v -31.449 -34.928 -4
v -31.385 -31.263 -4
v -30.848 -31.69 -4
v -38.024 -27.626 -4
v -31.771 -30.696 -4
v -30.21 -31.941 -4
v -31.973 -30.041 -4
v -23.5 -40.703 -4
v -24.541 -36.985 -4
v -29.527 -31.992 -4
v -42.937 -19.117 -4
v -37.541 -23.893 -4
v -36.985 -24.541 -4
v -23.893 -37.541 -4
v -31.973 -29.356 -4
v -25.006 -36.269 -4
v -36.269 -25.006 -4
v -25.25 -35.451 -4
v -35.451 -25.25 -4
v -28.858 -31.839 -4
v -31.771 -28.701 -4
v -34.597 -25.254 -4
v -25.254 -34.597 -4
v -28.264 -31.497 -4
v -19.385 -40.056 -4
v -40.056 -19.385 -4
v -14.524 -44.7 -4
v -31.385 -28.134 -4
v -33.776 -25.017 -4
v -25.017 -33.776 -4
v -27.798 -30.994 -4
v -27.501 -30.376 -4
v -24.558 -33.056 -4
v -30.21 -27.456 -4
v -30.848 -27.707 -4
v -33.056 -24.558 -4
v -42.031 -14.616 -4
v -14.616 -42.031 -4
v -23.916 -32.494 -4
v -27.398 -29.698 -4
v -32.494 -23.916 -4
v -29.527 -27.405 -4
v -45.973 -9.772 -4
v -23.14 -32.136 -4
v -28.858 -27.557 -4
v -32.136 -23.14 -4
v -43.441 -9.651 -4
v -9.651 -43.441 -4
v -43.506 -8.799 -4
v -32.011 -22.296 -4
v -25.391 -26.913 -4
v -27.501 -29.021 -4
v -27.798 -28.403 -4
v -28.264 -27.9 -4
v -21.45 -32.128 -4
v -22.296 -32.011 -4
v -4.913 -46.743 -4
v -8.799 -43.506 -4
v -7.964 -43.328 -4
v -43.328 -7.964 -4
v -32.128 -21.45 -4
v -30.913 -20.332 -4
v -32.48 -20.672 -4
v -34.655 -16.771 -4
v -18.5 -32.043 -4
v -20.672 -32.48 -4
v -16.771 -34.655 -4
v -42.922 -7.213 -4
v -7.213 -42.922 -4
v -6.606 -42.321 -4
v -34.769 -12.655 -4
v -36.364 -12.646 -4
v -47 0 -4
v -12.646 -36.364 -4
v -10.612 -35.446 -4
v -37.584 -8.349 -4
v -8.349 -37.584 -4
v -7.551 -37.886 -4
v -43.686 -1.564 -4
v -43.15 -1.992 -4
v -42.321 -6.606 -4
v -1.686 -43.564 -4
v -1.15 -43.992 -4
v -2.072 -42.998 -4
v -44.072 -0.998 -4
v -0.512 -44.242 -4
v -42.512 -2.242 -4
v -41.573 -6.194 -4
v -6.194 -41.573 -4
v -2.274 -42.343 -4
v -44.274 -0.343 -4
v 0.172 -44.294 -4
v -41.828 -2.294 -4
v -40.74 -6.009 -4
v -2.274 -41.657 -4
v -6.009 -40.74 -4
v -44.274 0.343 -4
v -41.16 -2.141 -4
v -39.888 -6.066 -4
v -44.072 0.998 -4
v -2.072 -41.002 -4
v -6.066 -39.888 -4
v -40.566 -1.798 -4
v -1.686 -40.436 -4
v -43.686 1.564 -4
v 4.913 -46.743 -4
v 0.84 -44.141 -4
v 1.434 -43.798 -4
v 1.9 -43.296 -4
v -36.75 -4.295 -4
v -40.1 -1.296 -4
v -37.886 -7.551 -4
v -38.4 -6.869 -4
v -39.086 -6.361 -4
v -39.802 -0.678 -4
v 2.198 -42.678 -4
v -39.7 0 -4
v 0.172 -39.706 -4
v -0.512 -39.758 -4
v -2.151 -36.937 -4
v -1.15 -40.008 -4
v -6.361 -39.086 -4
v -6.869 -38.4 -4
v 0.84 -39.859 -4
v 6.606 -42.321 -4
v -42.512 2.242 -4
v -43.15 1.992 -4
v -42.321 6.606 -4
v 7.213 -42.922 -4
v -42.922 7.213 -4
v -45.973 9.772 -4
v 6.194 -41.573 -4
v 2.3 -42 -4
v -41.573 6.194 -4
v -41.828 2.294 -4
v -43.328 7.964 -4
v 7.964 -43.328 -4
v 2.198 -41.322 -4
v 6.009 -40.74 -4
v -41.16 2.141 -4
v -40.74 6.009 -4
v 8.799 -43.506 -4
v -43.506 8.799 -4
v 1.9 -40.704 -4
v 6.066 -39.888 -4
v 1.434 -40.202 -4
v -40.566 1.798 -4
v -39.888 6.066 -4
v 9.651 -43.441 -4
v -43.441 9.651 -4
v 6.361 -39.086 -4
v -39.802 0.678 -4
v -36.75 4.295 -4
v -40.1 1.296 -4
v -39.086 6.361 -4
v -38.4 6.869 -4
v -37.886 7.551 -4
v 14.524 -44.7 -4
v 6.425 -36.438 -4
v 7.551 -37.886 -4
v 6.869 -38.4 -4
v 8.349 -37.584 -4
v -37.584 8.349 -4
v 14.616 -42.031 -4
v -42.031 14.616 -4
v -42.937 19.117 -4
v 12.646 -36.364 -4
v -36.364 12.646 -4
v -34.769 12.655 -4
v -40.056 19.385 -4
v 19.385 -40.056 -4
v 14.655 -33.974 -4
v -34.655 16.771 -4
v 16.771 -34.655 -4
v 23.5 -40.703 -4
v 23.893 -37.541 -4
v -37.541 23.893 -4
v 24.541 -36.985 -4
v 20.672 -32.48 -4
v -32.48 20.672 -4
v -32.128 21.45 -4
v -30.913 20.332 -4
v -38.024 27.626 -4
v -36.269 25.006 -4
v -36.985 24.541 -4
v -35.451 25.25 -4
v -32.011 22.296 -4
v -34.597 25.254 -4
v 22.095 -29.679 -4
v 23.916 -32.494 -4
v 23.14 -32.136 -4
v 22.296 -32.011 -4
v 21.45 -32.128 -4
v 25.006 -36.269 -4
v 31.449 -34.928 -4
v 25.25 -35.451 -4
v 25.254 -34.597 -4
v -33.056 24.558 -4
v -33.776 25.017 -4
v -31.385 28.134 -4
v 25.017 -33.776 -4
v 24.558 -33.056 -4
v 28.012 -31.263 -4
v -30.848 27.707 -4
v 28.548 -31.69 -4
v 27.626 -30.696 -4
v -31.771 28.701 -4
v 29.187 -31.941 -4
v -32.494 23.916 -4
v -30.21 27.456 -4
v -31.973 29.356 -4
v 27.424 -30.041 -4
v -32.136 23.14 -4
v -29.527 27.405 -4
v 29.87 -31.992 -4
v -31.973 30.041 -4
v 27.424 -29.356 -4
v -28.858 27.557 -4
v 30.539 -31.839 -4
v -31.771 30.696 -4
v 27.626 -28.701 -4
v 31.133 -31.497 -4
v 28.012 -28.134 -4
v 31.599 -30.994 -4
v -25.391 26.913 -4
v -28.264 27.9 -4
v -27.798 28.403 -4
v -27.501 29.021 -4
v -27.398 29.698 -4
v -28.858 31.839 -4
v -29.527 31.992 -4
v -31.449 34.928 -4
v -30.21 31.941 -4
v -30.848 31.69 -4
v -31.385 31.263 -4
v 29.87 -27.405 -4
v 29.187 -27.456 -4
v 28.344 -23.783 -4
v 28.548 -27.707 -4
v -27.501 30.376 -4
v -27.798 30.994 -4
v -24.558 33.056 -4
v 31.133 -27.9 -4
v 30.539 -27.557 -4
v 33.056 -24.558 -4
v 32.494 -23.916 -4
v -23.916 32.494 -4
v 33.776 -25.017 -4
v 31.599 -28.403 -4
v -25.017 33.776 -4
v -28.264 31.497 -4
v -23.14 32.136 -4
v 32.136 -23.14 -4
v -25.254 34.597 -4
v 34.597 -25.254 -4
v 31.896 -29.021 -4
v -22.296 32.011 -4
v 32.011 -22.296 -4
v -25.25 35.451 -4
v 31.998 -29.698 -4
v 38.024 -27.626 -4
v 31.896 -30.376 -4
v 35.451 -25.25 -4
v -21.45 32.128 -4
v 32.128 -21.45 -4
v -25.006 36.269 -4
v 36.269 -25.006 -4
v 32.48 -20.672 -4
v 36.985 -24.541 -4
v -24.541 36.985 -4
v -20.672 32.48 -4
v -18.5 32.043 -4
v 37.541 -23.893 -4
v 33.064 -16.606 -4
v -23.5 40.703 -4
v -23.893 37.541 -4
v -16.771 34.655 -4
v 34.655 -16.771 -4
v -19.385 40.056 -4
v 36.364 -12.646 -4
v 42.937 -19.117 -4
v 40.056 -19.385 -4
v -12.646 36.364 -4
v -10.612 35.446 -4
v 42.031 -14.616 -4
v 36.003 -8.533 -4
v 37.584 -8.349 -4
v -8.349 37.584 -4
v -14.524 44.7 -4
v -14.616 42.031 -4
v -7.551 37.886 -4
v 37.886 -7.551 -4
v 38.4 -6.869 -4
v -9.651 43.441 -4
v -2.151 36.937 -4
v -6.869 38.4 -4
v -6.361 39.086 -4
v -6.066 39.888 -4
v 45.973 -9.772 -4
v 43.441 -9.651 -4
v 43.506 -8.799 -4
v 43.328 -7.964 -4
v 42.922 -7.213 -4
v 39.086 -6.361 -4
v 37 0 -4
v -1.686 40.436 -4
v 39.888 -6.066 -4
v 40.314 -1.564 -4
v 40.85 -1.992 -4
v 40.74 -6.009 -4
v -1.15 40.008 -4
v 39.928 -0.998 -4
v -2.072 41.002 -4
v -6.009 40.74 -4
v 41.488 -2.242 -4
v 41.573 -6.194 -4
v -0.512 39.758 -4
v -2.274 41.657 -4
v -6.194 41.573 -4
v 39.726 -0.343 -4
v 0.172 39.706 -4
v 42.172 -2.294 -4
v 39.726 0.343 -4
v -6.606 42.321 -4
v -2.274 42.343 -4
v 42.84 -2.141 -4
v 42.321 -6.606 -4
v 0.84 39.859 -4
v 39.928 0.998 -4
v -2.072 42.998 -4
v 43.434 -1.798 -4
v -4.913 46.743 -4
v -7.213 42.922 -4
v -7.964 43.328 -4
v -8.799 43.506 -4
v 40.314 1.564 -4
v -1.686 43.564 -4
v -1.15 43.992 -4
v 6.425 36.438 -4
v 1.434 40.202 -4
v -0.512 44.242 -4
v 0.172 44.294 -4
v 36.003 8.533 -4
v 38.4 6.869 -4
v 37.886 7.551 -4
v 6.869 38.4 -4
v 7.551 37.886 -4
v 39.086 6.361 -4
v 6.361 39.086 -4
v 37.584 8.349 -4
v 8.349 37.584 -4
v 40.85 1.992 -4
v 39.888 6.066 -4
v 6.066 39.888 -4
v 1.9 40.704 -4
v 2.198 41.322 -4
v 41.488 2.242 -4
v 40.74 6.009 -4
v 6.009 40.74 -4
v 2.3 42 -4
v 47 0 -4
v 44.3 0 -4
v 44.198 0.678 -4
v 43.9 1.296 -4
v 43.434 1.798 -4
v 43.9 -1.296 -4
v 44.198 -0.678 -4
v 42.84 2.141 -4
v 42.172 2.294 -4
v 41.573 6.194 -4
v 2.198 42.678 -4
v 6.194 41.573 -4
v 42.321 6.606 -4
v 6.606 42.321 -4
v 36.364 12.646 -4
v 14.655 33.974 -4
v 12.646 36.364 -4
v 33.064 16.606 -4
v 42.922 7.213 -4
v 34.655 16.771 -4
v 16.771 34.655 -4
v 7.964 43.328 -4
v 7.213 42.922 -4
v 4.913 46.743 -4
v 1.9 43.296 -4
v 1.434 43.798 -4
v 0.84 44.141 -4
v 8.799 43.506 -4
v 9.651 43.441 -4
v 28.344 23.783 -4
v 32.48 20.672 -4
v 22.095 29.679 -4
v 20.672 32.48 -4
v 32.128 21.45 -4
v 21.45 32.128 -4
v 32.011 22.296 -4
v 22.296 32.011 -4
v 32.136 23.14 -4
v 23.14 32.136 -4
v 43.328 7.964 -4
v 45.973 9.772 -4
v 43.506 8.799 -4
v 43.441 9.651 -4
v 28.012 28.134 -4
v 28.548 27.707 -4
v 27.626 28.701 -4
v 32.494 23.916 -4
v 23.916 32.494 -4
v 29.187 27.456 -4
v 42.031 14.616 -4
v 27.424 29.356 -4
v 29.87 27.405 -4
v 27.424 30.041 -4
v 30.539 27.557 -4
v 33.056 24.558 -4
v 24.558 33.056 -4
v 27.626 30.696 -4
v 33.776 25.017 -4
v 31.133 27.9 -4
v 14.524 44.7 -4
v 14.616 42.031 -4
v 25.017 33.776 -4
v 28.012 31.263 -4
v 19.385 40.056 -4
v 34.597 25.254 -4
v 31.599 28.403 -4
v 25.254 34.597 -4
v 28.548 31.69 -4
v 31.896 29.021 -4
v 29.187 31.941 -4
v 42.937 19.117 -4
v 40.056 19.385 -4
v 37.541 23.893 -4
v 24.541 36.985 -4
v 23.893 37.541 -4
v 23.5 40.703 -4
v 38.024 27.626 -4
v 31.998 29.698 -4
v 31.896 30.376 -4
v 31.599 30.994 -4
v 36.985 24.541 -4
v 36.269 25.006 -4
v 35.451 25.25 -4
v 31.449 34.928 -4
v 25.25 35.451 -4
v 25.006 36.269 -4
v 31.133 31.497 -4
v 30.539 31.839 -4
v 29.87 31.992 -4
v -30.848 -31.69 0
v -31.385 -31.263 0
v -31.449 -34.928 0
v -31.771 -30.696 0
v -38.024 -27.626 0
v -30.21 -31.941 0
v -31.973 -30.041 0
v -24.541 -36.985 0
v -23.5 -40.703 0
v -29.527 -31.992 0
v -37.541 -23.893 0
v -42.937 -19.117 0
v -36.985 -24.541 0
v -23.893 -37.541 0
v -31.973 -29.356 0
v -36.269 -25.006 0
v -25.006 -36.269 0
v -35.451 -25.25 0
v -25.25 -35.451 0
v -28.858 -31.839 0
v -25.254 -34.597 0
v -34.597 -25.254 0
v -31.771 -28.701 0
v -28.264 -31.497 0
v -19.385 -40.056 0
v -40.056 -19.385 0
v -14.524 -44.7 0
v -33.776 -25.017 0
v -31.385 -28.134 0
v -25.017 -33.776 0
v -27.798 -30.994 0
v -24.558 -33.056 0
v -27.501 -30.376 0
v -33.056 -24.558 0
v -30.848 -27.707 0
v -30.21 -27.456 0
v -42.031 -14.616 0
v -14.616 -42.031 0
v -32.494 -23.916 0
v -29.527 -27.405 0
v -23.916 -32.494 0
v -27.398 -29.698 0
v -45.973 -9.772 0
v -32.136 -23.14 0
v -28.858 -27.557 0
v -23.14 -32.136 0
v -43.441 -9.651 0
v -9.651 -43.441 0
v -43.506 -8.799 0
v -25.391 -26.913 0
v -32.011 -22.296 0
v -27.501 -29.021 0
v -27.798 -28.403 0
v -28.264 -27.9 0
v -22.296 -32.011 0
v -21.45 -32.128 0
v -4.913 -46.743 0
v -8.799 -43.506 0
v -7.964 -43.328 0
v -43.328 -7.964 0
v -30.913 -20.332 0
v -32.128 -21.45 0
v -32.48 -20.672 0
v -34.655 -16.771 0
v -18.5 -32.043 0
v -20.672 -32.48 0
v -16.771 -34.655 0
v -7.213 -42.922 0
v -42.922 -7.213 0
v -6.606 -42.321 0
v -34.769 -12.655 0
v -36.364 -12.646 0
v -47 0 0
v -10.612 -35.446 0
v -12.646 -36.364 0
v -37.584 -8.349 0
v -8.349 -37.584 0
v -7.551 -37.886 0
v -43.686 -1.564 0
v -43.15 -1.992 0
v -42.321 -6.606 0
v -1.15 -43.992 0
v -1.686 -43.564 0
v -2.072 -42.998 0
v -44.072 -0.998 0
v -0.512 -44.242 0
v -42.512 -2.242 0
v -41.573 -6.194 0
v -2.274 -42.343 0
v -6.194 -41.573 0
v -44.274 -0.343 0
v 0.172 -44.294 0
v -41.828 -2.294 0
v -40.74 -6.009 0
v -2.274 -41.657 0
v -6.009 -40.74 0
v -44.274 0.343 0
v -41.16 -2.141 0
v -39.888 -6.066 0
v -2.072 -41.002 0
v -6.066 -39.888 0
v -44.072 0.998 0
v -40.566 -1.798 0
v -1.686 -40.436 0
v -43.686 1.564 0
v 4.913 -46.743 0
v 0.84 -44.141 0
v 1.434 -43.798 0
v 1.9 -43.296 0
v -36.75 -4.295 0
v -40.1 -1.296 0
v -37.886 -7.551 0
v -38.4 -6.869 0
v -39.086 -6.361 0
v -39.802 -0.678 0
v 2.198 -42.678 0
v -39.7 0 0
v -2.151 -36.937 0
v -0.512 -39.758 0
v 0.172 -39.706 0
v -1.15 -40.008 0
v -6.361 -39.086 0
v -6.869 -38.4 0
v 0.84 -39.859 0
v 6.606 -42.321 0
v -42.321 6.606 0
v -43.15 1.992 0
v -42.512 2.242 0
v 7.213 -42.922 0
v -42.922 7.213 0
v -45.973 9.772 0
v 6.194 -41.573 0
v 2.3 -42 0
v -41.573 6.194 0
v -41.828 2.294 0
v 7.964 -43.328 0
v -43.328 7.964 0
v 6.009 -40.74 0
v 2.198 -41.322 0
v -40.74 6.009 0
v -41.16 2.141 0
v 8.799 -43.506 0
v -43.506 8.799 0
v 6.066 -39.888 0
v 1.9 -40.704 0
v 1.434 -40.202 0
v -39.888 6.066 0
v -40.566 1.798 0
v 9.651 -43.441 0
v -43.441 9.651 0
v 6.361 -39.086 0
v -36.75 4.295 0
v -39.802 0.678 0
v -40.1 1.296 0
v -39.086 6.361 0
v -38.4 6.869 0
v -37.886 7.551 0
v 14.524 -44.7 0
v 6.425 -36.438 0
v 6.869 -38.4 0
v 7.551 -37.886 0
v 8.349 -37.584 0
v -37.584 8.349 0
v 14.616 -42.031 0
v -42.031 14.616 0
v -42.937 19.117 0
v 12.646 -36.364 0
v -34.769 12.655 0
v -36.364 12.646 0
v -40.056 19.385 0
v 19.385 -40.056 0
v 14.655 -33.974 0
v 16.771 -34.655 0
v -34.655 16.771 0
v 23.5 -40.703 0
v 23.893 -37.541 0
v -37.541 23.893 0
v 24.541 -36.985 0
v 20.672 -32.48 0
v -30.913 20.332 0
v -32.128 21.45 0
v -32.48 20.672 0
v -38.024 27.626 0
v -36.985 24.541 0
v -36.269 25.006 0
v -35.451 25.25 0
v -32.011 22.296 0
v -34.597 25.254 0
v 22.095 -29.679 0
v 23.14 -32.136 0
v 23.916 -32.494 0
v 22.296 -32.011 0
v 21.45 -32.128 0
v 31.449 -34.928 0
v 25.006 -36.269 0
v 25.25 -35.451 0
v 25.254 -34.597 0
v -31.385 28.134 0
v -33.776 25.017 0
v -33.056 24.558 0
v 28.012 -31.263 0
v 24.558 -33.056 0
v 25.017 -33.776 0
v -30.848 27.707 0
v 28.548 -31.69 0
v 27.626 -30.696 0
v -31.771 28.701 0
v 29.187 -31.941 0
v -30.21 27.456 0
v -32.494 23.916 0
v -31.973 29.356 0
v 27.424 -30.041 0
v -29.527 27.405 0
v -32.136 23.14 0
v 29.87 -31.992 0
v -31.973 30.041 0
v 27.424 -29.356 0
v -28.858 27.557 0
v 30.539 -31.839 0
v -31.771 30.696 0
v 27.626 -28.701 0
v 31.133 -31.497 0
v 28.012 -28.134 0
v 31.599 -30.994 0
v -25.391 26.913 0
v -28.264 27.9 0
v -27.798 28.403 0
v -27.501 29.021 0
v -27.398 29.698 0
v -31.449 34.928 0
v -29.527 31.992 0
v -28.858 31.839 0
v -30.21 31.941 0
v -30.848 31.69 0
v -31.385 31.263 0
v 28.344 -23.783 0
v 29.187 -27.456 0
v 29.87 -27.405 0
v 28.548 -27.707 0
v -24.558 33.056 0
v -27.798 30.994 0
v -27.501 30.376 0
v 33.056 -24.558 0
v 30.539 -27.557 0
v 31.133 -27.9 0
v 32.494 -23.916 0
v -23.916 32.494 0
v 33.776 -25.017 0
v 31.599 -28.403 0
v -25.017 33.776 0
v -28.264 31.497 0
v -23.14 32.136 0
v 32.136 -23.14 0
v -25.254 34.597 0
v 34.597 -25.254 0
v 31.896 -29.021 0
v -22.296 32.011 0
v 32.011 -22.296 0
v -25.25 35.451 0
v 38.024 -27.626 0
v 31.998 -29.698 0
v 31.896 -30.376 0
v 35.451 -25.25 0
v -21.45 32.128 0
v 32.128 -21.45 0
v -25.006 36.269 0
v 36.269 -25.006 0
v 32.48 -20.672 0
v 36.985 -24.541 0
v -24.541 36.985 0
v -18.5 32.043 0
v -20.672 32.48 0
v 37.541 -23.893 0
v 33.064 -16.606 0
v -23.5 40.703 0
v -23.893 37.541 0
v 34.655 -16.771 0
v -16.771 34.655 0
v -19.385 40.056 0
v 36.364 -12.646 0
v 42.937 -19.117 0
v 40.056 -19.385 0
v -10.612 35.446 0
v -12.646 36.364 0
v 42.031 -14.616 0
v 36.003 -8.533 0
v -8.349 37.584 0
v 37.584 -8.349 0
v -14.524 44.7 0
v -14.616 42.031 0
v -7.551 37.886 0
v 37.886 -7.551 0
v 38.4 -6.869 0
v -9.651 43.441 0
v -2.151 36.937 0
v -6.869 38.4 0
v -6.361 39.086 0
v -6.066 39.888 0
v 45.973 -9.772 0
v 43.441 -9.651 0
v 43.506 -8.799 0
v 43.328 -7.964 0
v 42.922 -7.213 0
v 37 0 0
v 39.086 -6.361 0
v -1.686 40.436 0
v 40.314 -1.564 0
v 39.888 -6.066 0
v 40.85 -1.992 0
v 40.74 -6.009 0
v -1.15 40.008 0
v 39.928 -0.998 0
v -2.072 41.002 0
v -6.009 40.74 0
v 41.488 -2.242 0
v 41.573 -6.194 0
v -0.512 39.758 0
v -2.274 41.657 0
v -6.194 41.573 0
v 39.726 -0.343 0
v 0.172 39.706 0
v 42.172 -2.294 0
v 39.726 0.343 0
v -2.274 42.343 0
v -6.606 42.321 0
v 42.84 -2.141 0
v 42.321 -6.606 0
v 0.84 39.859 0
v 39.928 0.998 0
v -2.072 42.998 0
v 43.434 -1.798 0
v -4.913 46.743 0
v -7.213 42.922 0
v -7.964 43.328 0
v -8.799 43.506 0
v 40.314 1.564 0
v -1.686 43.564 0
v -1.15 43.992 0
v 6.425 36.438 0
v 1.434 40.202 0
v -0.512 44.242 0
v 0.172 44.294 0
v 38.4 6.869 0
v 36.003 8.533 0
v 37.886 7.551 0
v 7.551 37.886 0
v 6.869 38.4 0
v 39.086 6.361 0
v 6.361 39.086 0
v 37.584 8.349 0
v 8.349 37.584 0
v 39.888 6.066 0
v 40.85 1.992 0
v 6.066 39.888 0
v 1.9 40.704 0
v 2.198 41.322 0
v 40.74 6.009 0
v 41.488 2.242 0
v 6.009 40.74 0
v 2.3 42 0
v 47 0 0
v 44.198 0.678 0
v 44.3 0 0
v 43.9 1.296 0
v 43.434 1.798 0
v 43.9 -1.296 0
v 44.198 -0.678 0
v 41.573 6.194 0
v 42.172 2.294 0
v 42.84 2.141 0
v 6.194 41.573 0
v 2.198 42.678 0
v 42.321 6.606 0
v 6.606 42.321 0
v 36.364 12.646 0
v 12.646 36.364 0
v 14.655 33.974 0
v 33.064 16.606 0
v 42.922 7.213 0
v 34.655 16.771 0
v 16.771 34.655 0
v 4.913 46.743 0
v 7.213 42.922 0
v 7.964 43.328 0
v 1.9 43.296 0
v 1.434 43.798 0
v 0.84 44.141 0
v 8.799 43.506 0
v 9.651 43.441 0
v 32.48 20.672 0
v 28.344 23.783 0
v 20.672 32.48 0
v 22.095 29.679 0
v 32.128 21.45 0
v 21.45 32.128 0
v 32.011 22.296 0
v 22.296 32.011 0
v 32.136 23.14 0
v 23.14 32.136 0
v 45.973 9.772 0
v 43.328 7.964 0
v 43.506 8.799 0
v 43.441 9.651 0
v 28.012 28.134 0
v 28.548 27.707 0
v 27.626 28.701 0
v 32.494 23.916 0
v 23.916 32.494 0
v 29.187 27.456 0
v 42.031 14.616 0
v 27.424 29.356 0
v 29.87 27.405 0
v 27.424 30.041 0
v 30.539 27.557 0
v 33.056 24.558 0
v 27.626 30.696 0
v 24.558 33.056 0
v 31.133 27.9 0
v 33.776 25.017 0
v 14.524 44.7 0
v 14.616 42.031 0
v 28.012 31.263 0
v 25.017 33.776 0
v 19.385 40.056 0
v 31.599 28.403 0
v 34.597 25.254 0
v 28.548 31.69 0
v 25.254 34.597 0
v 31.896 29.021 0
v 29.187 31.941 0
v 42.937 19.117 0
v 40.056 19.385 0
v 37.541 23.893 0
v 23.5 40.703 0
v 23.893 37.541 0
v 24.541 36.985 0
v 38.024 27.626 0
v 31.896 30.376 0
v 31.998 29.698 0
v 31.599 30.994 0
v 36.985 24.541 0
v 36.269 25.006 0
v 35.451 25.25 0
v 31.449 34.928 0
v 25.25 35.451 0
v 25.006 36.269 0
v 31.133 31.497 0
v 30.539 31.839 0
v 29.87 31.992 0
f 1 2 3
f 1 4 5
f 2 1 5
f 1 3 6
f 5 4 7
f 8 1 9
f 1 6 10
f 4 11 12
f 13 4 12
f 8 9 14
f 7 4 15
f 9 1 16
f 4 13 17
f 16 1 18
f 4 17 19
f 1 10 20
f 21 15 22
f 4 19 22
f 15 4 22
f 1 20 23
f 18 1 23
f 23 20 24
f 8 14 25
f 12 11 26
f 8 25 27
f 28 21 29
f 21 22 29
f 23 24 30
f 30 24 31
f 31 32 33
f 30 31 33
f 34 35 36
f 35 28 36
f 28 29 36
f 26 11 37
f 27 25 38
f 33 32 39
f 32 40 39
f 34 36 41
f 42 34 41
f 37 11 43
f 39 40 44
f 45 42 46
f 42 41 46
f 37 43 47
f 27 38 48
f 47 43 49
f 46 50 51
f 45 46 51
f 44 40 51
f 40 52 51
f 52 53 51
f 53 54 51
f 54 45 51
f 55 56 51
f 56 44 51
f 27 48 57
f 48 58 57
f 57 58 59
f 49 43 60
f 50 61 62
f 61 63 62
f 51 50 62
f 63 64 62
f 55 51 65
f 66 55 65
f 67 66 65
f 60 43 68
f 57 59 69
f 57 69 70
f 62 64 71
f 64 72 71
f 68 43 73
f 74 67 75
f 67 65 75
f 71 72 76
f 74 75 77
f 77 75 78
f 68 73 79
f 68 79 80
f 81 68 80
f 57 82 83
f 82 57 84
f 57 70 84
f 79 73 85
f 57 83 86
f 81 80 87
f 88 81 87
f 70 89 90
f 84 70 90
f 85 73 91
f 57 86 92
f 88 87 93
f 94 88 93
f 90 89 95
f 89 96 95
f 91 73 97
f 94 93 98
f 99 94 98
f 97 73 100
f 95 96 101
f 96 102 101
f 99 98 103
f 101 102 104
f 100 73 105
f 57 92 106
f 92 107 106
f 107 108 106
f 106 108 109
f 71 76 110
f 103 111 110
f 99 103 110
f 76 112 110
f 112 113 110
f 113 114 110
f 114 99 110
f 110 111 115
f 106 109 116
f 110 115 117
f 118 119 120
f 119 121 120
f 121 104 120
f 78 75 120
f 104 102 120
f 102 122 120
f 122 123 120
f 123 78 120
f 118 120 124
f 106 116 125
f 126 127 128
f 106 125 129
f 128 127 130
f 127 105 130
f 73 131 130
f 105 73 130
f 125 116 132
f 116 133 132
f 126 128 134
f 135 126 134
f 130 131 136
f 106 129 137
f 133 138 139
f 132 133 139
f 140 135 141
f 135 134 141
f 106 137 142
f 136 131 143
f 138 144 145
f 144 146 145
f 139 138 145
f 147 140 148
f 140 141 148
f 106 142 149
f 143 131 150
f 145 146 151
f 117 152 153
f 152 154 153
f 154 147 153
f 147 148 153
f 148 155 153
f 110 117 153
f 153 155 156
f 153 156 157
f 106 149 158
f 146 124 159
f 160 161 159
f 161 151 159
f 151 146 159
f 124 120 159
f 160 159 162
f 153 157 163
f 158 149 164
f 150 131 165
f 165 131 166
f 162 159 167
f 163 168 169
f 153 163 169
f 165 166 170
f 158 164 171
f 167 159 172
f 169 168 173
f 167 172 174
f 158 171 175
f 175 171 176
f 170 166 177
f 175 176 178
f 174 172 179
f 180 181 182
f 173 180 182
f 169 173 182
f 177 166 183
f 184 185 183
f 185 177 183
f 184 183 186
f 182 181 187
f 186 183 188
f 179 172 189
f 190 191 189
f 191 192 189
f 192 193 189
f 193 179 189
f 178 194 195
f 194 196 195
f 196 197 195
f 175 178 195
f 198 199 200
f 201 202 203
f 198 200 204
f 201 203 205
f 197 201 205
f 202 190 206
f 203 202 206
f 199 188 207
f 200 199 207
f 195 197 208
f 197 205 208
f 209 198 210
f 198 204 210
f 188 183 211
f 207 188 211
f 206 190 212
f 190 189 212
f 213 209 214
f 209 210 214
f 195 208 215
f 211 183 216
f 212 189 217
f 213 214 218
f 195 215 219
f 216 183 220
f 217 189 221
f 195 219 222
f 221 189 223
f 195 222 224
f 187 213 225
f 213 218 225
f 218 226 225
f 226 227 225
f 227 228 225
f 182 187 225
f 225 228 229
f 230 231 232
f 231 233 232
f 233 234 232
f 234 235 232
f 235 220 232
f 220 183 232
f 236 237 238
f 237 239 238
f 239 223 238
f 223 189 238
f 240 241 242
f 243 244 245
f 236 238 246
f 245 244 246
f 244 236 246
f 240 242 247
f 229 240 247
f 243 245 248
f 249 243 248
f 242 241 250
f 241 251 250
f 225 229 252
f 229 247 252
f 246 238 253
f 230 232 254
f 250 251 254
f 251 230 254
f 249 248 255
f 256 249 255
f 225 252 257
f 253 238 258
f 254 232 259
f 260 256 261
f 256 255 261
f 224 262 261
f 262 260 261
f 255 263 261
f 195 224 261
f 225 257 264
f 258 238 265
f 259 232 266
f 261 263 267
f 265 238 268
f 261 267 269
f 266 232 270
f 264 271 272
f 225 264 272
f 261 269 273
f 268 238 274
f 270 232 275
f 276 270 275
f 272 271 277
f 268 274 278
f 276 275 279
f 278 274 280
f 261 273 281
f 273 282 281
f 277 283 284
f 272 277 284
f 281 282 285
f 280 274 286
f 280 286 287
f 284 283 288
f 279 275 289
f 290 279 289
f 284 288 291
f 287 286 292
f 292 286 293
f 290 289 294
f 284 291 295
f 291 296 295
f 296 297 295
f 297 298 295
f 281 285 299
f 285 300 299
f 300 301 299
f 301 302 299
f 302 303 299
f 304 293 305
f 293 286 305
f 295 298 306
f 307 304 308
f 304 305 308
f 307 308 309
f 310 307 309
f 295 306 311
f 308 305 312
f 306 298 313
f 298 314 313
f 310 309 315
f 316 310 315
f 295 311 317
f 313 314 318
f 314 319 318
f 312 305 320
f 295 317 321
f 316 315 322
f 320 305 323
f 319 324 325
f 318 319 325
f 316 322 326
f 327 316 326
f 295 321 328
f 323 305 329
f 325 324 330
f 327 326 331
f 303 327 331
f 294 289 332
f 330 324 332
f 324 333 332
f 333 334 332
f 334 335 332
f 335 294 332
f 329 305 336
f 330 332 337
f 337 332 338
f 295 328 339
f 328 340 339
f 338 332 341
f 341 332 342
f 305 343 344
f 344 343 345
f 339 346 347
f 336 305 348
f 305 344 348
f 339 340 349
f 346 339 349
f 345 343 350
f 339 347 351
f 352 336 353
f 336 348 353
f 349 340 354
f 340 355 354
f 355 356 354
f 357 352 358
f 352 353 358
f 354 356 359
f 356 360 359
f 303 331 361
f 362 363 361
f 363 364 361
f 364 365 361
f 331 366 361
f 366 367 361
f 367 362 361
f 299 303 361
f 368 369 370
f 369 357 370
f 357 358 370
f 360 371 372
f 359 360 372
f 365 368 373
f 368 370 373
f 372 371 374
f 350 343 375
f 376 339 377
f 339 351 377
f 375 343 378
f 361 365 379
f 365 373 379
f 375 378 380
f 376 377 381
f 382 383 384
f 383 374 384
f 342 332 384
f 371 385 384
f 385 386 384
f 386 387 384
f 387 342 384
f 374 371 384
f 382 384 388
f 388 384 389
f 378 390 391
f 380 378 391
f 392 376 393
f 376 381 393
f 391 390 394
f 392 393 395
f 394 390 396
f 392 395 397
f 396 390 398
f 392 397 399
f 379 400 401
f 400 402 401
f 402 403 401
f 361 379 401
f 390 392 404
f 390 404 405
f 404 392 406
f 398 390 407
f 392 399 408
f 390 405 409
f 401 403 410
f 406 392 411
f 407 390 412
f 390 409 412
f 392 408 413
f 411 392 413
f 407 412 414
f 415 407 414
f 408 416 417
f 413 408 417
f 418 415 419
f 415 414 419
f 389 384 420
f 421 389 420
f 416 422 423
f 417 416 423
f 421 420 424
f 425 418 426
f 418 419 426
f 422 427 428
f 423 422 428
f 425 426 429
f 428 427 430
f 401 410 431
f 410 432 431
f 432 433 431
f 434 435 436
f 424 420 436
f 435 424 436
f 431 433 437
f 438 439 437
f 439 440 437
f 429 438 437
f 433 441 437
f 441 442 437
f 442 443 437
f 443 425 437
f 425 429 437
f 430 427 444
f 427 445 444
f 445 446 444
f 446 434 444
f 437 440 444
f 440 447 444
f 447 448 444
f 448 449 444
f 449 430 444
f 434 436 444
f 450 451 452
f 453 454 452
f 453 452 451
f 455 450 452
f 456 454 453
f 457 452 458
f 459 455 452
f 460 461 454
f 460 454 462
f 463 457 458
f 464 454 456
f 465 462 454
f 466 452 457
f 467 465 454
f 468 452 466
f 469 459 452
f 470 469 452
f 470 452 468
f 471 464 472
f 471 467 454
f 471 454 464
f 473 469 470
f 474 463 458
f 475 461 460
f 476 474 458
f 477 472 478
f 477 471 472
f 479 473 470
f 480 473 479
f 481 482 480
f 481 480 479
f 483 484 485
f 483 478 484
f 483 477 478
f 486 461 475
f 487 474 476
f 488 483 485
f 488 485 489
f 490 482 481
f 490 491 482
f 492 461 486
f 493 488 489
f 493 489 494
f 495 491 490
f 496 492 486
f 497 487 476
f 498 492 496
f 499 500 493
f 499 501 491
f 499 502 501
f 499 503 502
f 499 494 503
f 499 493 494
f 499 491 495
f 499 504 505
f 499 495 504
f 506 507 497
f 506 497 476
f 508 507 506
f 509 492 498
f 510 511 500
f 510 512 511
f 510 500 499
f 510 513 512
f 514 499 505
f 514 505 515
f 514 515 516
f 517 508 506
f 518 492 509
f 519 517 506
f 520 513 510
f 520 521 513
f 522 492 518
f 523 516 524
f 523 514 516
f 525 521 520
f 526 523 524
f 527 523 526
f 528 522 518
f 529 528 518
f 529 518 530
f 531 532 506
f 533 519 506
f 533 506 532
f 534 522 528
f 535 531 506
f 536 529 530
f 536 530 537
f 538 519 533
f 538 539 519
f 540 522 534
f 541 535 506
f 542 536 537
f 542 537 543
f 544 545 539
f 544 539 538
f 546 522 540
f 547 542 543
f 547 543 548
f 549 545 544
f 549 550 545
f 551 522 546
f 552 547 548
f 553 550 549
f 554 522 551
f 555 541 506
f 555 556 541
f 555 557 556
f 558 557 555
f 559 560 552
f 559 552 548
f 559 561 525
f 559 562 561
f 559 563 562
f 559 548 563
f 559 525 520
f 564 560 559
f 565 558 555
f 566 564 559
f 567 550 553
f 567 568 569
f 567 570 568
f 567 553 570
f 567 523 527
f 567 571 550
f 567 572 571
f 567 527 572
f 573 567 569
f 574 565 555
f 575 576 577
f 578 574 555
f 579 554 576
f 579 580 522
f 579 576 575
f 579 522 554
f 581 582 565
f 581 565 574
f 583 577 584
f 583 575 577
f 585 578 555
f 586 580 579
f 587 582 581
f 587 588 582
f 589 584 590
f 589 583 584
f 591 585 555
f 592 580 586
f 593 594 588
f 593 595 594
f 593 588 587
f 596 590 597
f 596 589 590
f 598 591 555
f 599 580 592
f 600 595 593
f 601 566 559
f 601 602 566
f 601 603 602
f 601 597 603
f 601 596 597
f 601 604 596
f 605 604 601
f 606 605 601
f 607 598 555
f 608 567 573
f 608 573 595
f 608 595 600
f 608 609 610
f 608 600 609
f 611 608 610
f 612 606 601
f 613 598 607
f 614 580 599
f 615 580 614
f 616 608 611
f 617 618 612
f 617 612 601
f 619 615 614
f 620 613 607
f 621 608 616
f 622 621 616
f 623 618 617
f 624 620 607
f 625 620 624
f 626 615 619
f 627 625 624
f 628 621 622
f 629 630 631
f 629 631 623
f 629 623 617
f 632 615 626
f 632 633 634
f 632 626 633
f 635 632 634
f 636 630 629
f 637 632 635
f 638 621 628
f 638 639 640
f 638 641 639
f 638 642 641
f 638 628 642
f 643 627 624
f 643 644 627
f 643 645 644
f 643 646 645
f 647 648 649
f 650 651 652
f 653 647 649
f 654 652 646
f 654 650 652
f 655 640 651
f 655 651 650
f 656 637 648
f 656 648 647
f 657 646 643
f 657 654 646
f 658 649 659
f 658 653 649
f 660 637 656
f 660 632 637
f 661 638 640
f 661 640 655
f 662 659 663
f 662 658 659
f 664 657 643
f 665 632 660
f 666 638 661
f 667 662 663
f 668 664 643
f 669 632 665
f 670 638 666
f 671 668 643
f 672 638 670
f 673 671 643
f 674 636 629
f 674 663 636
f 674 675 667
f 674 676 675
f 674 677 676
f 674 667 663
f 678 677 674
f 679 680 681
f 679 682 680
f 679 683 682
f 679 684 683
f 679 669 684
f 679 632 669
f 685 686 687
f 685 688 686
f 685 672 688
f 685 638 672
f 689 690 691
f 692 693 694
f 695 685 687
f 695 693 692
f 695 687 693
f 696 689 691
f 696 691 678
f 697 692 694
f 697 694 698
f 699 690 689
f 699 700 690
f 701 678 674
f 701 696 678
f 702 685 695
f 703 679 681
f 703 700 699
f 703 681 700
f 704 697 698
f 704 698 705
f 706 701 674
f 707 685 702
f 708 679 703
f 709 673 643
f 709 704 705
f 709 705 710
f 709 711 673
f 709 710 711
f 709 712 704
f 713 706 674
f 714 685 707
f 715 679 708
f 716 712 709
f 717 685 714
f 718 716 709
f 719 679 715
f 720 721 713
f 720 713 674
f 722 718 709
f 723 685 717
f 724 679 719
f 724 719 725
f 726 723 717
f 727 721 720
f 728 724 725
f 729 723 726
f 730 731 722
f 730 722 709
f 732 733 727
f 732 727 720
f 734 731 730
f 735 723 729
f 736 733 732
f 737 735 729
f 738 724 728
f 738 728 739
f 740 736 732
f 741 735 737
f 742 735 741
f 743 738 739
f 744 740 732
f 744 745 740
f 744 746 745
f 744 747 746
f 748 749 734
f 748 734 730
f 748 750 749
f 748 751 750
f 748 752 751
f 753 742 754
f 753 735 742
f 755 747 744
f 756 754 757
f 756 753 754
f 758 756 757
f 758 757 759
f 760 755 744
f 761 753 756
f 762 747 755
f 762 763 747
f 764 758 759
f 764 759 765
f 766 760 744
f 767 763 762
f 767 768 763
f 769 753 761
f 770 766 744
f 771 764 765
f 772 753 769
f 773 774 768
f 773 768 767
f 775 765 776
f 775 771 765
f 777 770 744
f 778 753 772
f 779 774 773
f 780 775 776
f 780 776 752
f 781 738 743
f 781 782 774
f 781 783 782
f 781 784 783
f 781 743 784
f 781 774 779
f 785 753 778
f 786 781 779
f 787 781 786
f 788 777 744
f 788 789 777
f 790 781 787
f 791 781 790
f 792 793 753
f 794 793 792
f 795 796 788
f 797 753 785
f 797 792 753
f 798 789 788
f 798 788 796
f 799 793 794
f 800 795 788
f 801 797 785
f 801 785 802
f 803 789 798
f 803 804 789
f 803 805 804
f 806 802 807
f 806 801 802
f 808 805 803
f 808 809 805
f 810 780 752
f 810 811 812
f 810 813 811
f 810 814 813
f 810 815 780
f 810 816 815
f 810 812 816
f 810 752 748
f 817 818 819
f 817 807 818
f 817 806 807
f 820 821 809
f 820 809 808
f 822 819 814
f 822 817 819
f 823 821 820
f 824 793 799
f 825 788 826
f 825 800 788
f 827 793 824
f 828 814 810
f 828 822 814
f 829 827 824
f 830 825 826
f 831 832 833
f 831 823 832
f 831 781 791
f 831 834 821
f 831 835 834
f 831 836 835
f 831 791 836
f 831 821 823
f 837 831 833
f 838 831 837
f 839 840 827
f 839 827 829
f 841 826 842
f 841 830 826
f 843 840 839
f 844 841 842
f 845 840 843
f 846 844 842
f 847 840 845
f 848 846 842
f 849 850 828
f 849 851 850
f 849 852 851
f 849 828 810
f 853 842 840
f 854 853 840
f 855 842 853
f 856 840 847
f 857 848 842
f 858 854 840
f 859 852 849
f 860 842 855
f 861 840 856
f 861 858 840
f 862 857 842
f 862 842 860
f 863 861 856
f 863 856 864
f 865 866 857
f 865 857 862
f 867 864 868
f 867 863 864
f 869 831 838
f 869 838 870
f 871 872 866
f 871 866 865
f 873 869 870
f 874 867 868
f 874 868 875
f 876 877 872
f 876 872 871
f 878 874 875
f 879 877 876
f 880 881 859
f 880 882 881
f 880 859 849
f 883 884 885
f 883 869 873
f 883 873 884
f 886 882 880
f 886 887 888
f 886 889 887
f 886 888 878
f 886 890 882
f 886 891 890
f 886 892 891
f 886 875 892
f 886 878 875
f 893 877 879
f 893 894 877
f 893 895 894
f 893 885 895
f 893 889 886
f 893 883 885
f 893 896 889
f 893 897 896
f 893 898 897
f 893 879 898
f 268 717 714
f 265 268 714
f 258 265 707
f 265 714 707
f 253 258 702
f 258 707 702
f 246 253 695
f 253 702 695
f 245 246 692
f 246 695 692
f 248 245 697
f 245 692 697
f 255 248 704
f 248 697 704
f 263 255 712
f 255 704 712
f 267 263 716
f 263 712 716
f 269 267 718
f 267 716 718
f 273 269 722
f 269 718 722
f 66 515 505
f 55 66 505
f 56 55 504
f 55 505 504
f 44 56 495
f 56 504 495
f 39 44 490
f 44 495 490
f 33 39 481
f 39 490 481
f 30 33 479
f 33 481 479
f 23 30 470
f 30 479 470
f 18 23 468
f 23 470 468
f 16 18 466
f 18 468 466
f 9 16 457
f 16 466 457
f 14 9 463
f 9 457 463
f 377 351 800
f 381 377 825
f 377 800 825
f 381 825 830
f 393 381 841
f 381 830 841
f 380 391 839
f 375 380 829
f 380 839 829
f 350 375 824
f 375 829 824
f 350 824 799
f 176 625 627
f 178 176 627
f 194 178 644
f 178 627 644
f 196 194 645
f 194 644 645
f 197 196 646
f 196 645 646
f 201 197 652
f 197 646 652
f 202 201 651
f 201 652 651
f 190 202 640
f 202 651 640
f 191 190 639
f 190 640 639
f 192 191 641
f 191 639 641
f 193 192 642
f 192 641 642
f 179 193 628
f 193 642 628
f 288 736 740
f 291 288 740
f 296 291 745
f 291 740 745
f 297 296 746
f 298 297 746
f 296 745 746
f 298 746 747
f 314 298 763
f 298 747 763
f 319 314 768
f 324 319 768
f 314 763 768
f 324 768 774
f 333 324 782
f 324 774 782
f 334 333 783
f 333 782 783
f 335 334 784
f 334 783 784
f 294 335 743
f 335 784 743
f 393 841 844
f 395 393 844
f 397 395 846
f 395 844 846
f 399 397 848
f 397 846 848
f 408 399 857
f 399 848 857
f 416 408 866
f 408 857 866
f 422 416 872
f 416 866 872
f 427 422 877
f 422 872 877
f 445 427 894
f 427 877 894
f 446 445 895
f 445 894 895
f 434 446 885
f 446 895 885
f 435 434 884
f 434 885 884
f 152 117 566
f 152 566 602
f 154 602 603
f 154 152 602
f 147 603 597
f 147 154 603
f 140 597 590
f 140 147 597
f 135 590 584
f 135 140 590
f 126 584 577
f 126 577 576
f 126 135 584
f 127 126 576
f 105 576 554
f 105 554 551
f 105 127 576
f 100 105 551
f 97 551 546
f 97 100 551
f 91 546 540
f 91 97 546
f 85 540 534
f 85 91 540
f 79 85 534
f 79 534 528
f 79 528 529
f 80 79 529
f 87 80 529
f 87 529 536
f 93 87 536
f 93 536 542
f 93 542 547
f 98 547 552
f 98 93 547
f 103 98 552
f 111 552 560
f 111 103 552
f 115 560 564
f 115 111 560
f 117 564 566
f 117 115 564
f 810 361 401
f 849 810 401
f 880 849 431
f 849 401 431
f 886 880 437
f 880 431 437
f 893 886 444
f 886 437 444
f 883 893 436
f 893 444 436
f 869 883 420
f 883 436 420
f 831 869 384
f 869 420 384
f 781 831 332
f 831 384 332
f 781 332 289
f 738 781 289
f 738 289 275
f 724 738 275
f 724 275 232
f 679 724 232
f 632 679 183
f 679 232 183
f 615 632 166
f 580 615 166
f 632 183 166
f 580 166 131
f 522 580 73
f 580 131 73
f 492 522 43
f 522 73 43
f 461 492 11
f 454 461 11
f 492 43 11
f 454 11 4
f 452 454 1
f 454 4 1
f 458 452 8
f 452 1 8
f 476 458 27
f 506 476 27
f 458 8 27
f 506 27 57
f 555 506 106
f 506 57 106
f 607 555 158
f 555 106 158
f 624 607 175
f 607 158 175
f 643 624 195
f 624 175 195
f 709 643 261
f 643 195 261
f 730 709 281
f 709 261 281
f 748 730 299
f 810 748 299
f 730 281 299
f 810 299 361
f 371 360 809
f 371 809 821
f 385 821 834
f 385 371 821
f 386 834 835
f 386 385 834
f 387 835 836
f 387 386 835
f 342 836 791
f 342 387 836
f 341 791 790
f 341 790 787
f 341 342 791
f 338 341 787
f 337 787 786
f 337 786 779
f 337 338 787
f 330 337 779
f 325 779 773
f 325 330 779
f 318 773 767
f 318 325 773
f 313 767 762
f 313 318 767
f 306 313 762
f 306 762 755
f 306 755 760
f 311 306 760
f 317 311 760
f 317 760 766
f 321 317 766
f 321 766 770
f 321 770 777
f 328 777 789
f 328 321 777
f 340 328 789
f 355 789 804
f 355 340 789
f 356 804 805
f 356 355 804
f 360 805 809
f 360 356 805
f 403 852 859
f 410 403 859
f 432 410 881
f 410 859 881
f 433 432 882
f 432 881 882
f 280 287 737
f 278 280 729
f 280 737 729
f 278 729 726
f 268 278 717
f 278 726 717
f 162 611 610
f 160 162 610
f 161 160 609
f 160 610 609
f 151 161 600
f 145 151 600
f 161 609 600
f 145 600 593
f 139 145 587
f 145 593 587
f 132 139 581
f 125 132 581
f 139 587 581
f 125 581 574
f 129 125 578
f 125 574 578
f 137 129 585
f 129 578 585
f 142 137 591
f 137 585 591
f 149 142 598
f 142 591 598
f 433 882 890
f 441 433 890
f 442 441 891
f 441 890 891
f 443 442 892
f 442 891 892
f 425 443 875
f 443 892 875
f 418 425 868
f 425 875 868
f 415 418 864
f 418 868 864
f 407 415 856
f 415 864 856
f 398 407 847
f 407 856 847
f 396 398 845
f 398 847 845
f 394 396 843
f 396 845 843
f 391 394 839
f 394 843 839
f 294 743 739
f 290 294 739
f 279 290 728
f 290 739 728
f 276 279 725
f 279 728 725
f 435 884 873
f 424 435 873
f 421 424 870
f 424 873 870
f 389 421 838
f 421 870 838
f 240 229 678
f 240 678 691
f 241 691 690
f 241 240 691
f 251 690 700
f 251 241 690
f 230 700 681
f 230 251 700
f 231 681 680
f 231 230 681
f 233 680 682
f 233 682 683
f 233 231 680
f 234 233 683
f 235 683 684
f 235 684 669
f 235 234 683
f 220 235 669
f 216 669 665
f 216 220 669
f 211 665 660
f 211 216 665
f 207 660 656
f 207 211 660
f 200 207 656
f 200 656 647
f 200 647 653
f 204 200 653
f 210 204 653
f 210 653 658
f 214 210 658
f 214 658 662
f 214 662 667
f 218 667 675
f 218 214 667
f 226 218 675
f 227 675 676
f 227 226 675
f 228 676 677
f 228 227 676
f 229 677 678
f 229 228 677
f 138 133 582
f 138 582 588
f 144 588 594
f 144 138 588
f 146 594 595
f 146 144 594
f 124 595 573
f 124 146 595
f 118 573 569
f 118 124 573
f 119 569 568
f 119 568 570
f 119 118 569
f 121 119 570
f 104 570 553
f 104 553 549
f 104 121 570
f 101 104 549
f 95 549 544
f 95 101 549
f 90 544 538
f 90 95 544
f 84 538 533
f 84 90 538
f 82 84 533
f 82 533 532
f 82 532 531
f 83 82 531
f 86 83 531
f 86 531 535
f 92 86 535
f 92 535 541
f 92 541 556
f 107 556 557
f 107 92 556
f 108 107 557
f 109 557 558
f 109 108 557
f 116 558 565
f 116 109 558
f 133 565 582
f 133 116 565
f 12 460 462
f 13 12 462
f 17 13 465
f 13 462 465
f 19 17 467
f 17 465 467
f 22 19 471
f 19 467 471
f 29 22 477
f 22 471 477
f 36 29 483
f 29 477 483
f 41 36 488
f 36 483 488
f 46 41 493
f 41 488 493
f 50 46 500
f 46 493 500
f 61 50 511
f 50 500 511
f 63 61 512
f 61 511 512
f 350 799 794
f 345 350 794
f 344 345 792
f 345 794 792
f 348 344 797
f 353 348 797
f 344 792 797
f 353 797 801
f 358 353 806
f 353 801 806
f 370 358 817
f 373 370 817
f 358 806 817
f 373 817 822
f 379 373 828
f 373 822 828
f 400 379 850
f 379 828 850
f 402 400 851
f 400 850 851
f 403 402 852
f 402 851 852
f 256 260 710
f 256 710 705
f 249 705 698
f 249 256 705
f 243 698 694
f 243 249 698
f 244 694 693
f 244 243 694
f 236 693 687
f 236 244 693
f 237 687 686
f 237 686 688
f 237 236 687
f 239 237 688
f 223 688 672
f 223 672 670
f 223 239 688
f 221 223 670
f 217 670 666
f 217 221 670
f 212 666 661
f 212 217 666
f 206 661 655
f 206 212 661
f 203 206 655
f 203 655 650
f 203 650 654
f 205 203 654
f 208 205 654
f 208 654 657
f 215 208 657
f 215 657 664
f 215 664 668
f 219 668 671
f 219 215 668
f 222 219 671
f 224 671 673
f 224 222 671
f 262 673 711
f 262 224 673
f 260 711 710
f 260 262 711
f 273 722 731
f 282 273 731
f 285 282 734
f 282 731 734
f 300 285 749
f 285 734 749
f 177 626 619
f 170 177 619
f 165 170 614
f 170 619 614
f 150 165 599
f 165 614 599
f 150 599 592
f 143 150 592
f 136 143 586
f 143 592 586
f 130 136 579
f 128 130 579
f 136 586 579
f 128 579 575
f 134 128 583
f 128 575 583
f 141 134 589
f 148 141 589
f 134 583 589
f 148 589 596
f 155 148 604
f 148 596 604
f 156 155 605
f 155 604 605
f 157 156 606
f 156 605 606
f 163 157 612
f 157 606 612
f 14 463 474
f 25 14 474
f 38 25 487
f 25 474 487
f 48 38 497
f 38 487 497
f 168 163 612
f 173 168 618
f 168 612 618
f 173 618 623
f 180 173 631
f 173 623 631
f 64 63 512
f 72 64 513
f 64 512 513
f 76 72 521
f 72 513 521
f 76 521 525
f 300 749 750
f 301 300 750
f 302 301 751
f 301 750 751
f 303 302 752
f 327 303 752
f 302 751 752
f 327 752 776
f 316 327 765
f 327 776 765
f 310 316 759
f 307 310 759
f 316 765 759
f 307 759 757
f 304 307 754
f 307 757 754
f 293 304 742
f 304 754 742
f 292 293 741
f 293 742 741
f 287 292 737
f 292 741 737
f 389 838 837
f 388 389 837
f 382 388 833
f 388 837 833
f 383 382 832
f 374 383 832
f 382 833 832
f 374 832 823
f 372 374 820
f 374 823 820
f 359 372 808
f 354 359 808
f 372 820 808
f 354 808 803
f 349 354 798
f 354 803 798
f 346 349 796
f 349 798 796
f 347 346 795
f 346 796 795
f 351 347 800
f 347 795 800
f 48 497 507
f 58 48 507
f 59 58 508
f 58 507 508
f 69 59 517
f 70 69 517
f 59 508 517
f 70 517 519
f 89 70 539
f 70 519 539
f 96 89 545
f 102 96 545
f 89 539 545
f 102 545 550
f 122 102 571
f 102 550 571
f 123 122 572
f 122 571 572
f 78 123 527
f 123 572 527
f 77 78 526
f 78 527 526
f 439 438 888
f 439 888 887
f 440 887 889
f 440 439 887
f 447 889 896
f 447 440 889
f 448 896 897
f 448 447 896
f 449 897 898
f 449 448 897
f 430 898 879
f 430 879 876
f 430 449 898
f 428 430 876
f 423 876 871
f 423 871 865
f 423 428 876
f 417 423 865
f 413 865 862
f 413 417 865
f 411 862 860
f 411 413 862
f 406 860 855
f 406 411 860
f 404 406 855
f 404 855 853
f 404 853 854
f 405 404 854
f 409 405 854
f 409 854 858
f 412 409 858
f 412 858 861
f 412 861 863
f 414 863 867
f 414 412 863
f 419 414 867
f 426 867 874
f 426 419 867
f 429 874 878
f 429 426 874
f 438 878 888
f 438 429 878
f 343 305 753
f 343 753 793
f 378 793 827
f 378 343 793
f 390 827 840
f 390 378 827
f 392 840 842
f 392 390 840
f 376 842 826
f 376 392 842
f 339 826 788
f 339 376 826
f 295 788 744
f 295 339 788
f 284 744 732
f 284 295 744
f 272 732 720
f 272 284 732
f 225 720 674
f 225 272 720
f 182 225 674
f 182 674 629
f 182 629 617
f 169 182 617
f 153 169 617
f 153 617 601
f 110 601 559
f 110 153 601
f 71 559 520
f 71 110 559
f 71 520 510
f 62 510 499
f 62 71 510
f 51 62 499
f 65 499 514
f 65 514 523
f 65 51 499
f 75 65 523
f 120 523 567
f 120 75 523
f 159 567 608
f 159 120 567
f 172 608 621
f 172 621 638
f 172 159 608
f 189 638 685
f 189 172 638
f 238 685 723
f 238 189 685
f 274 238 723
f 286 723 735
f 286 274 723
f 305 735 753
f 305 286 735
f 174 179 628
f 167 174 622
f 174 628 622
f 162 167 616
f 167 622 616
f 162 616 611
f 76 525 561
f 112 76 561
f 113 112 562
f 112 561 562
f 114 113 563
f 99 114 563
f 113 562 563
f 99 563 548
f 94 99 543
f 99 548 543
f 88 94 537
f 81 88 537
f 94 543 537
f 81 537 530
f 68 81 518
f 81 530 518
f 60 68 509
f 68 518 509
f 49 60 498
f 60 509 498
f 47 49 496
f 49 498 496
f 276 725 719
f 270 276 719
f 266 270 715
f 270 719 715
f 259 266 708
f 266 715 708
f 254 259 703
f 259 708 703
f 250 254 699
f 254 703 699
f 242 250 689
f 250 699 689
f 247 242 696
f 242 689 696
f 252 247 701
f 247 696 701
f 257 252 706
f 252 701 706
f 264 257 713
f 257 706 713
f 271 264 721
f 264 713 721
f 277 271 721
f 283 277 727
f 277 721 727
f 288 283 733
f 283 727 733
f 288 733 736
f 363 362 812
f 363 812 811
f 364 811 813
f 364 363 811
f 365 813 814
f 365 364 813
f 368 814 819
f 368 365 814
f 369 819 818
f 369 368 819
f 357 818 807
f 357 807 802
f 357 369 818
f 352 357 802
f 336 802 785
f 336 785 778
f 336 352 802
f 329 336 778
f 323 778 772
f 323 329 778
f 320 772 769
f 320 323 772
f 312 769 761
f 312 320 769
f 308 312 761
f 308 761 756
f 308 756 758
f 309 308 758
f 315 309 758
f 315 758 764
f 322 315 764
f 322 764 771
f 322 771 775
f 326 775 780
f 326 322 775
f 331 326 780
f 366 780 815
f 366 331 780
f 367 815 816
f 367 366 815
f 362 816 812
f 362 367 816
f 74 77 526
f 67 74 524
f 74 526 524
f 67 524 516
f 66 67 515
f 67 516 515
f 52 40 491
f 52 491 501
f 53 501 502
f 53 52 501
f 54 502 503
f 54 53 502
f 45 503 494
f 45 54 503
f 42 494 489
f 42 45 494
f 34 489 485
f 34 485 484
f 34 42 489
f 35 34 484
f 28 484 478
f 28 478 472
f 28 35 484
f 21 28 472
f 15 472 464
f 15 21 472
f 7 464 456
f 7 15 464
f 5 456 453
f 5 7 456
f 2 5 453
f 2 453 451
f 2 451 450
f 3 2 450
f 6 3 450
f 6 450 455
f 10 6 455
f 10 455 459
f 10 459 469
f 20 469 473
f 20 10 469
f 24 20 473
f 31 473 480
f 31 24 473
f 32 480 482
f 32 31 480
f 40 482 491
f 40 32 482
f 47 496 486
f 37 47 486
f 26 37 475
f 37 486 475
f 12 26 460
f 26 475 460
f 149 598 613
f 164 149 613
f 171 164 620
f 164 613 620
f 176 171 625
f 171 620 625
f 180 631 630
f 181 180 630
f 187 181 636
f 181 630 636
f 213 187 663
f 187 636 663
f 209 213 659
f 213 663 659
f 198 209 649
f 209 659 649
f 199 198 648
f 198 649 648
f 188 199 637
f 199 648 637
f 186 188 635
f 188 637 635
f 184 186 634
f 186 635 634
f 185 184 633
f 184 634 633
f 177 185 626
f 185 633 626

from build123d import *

# Parameters (mm, degrees)
SKETCH_1_R          = 47
SKETCH_1_R_2        = 37
SKETCH_1_R_3        = 2.3
EXTRUDE_1_DEPTH     = 4
CUT_EXTRUDE_1_DEPTH = 5


with BuildPart() as part:
    # 草图1 → 凸台-拉伸1 (new body)
    with BuildSketch(Plane.XY):
        Circle(SKETCH_1_R)
        Circle(SKETCH_1_R_2, mode=Mode.SUBTRACT)
        with Locations((0, 42)):
            Circle(SKETCH_1_R_3, mode=Mode.SUBTRACT)
        with Locations((29.69848481, 29.69848481)):
            Circle(SKETCH_1_R_3, mode=Mode.SUBTRACT)
        with Locations((42, 0)):
            Circle(SKETCH_1_R_3, mode=Mode.SUBTRACT)
        with Locations((29.69848481, -29.69848481)):
            Circle(SKETCH_1_R_3, mode=Mode.SUBTRACT)
        with Locations((0, -42)):
            Circle(SKETCH_1_R_3, mode=Mode.SUBTRACT)
        with Locations((-29.69848481, -29.69848481)):
            Circle(SKETCH_1_R_3, mode=Mode.SUBTRACT)
        with Locations((-42, 0)):
            Circle(SKETCH_1_R_3, mode=Mode.SUBTRACT)
        with Locations((-29.69848481, 29.69848481)):
            Circle(SKETCH_1_R_3, mode=Mode.SUBTRACT)
    extrude(amount=EXTRUDE_1_DEPTH)

    # 草图3 → 切除-拉伸1 (cut, through all)
    with BuildSketch(Plane.XY.offset(4)):
        with BuildLine():
            ThreePointArc((23.893381773, 37.541394586), (17.02941274, 41.112639197), (9.65060241, 43.440946964))
            ThreePointArc((9.65060241, 43.440946964), (6.071396834, 41.162946208), (8.34939759, 37.583740632))
            ThreePointArc((8.34939759, 37.583740632), (14.733312146, 35.569362002), (20.671802208, 32.479633518))
            ThreePointArc((20.671802208, 32.479633518), (24.813472524, 33.399724269), (23.893381773, 37.541394586))
        make_face()
        with BuildLine():
            ThreePointArc((43.440946964, 9.65060241), (41.112639197, 17.02941274), (37.541394586, 23.893381773))
            ThreePointArc((37.541394586, 23.893381773), (33.399724269, 24.813472524), (32.479633518, 20.671802208))
            ThreePointArc((32.479633518, 20.671802208), (35.569362002, 14.733312146), (37.583740632, 8.34939759))
            ThreePointArc((37.583740632, 8.34939759), (41.162946208, 6.071396834), (43.440946964, 9.65060241))
        make_face()
        with BuildLine():
            ThreePointArc((37.541394586, -23.893381773), (41.112639197, -17.02941274), (43.440946964, -9.65060241))
            ThreePointArc((43.440946964, -9.65060241), (41.162946208, -6.071396834), (37.583740632, -8.34939759))
            ThreePointArc((37.583740632, -8.34939759), (35.569362002, -14.733312146), (32.479633518, -20.671802208))
            ThreePointArc((32.479633518, -20.671802208), (33.399724269, -24.813472524), (37.541394586, -23.893381773))
        make_face()
        with BuildLine():
            ThreePointArc((9.65060241, -43.440946964), (17.02941274, -41.112639197), (23.893381773, -37.541394586))
            ThreePointArc((23.893381773, -37.541394586), (24.813472524, -33.399724269), (20.671802208, -32.479633518))
            ThreePointArc((20.671802208, -32.479633518), (14.733312146, -35.569362002), (8.34939759, -37.583740632))
            ThreePointArc((8.34939759, -37.583740632), (6.071396834, -41.162946208), (9.65060241, -43.440946964))
        make_face()
        with BuildLine():
            ThreePointArc((-23.893381773, -37.541394586), (-17.02941274, -41.112639197), (-9.65060241, -43.440946964))
            ThreePointArc((-9.65060241, -43.440946964), (-6.071396834, -41.162946208), (-8.34939759, -37.583740632))
            ThreePointArc((-8.34939759, -37.583740632), (-14.733312146, -35.569362002), (-20.671802208, -32.479633518))
            ThreePointArc((-20.671802208, -32.479633518), (-24.813472524, -33.399724269), (-23.893381773, -37.541394586))
        make_face()
        with BuildLine():
            ThreePointArc((-43.440946964, -9.65060241), (-41.112639197, -17.02941274), (-37.541394586, -23.893381773))
            ThreePointArc((-37.541394586, -23.893381773), (-33.399724269, -24.813472524), (-32.479633518, -20.671802208))
            ThreePointArc((-32.479633518, -20.671802208), (-35.569362002, -14.733312146), (-37.583740632, -8.34939759))
            ThreePointArc((-37.583740632, -8.34939759), (-41.162946208, -6.071396834), (-43.440946964, -9.65060241))
        make_face()
        with BuildLine():
            ThreePointArc((-37.541394586, 23.893381773), (-41.112639197, 17.02941274), (-43.440946964, 9.65060241))
            ThreePointArc((-43.440946964, 9.65060241), (-41.162946208, 6.071396834), (-37.583740632, 8.34939759))
            ThreePointArc((-37.583740632, 8.34939759), (-35.569362002, 14.733312146), (-32.479633518, 20.671802208))
            ThreePointArc((-32.479633518, 20.671802208), (-33.399724269, 24.813472524), (-37.541394586, 23.893381773))
        make_face()
        with BuildLine():
            ThreePointArc((-9.65060241, 43.440946964), (-17.02941274, 41.112639197), (-23.893381773, 37.541394586))
            ThreePointArc((-23.893381773, 37.541394586), (-24.813472524, 33.399724269), (-20.671802208, 32.479633518))
            ThreePointArc((-20.671802208, 32.479633518), (-14.733312146, 35.569362002), (-8.34939759, 37.583740632))
            ThreePointArc((-8.34939759, 37.583740632), (-6.071396834, 41.162946208), (-9.65060241, 43.440946964))
        make_face()
    extrude(amount=-CUT_EXTRUDE_1_DEPTH, mode=Mode.SUBTRACT)


with BuildPart() as part_1:
    # Move Body 1: moved
    add(part.part.moved(Location((0, 0, -4))))


solid = part_1.part
